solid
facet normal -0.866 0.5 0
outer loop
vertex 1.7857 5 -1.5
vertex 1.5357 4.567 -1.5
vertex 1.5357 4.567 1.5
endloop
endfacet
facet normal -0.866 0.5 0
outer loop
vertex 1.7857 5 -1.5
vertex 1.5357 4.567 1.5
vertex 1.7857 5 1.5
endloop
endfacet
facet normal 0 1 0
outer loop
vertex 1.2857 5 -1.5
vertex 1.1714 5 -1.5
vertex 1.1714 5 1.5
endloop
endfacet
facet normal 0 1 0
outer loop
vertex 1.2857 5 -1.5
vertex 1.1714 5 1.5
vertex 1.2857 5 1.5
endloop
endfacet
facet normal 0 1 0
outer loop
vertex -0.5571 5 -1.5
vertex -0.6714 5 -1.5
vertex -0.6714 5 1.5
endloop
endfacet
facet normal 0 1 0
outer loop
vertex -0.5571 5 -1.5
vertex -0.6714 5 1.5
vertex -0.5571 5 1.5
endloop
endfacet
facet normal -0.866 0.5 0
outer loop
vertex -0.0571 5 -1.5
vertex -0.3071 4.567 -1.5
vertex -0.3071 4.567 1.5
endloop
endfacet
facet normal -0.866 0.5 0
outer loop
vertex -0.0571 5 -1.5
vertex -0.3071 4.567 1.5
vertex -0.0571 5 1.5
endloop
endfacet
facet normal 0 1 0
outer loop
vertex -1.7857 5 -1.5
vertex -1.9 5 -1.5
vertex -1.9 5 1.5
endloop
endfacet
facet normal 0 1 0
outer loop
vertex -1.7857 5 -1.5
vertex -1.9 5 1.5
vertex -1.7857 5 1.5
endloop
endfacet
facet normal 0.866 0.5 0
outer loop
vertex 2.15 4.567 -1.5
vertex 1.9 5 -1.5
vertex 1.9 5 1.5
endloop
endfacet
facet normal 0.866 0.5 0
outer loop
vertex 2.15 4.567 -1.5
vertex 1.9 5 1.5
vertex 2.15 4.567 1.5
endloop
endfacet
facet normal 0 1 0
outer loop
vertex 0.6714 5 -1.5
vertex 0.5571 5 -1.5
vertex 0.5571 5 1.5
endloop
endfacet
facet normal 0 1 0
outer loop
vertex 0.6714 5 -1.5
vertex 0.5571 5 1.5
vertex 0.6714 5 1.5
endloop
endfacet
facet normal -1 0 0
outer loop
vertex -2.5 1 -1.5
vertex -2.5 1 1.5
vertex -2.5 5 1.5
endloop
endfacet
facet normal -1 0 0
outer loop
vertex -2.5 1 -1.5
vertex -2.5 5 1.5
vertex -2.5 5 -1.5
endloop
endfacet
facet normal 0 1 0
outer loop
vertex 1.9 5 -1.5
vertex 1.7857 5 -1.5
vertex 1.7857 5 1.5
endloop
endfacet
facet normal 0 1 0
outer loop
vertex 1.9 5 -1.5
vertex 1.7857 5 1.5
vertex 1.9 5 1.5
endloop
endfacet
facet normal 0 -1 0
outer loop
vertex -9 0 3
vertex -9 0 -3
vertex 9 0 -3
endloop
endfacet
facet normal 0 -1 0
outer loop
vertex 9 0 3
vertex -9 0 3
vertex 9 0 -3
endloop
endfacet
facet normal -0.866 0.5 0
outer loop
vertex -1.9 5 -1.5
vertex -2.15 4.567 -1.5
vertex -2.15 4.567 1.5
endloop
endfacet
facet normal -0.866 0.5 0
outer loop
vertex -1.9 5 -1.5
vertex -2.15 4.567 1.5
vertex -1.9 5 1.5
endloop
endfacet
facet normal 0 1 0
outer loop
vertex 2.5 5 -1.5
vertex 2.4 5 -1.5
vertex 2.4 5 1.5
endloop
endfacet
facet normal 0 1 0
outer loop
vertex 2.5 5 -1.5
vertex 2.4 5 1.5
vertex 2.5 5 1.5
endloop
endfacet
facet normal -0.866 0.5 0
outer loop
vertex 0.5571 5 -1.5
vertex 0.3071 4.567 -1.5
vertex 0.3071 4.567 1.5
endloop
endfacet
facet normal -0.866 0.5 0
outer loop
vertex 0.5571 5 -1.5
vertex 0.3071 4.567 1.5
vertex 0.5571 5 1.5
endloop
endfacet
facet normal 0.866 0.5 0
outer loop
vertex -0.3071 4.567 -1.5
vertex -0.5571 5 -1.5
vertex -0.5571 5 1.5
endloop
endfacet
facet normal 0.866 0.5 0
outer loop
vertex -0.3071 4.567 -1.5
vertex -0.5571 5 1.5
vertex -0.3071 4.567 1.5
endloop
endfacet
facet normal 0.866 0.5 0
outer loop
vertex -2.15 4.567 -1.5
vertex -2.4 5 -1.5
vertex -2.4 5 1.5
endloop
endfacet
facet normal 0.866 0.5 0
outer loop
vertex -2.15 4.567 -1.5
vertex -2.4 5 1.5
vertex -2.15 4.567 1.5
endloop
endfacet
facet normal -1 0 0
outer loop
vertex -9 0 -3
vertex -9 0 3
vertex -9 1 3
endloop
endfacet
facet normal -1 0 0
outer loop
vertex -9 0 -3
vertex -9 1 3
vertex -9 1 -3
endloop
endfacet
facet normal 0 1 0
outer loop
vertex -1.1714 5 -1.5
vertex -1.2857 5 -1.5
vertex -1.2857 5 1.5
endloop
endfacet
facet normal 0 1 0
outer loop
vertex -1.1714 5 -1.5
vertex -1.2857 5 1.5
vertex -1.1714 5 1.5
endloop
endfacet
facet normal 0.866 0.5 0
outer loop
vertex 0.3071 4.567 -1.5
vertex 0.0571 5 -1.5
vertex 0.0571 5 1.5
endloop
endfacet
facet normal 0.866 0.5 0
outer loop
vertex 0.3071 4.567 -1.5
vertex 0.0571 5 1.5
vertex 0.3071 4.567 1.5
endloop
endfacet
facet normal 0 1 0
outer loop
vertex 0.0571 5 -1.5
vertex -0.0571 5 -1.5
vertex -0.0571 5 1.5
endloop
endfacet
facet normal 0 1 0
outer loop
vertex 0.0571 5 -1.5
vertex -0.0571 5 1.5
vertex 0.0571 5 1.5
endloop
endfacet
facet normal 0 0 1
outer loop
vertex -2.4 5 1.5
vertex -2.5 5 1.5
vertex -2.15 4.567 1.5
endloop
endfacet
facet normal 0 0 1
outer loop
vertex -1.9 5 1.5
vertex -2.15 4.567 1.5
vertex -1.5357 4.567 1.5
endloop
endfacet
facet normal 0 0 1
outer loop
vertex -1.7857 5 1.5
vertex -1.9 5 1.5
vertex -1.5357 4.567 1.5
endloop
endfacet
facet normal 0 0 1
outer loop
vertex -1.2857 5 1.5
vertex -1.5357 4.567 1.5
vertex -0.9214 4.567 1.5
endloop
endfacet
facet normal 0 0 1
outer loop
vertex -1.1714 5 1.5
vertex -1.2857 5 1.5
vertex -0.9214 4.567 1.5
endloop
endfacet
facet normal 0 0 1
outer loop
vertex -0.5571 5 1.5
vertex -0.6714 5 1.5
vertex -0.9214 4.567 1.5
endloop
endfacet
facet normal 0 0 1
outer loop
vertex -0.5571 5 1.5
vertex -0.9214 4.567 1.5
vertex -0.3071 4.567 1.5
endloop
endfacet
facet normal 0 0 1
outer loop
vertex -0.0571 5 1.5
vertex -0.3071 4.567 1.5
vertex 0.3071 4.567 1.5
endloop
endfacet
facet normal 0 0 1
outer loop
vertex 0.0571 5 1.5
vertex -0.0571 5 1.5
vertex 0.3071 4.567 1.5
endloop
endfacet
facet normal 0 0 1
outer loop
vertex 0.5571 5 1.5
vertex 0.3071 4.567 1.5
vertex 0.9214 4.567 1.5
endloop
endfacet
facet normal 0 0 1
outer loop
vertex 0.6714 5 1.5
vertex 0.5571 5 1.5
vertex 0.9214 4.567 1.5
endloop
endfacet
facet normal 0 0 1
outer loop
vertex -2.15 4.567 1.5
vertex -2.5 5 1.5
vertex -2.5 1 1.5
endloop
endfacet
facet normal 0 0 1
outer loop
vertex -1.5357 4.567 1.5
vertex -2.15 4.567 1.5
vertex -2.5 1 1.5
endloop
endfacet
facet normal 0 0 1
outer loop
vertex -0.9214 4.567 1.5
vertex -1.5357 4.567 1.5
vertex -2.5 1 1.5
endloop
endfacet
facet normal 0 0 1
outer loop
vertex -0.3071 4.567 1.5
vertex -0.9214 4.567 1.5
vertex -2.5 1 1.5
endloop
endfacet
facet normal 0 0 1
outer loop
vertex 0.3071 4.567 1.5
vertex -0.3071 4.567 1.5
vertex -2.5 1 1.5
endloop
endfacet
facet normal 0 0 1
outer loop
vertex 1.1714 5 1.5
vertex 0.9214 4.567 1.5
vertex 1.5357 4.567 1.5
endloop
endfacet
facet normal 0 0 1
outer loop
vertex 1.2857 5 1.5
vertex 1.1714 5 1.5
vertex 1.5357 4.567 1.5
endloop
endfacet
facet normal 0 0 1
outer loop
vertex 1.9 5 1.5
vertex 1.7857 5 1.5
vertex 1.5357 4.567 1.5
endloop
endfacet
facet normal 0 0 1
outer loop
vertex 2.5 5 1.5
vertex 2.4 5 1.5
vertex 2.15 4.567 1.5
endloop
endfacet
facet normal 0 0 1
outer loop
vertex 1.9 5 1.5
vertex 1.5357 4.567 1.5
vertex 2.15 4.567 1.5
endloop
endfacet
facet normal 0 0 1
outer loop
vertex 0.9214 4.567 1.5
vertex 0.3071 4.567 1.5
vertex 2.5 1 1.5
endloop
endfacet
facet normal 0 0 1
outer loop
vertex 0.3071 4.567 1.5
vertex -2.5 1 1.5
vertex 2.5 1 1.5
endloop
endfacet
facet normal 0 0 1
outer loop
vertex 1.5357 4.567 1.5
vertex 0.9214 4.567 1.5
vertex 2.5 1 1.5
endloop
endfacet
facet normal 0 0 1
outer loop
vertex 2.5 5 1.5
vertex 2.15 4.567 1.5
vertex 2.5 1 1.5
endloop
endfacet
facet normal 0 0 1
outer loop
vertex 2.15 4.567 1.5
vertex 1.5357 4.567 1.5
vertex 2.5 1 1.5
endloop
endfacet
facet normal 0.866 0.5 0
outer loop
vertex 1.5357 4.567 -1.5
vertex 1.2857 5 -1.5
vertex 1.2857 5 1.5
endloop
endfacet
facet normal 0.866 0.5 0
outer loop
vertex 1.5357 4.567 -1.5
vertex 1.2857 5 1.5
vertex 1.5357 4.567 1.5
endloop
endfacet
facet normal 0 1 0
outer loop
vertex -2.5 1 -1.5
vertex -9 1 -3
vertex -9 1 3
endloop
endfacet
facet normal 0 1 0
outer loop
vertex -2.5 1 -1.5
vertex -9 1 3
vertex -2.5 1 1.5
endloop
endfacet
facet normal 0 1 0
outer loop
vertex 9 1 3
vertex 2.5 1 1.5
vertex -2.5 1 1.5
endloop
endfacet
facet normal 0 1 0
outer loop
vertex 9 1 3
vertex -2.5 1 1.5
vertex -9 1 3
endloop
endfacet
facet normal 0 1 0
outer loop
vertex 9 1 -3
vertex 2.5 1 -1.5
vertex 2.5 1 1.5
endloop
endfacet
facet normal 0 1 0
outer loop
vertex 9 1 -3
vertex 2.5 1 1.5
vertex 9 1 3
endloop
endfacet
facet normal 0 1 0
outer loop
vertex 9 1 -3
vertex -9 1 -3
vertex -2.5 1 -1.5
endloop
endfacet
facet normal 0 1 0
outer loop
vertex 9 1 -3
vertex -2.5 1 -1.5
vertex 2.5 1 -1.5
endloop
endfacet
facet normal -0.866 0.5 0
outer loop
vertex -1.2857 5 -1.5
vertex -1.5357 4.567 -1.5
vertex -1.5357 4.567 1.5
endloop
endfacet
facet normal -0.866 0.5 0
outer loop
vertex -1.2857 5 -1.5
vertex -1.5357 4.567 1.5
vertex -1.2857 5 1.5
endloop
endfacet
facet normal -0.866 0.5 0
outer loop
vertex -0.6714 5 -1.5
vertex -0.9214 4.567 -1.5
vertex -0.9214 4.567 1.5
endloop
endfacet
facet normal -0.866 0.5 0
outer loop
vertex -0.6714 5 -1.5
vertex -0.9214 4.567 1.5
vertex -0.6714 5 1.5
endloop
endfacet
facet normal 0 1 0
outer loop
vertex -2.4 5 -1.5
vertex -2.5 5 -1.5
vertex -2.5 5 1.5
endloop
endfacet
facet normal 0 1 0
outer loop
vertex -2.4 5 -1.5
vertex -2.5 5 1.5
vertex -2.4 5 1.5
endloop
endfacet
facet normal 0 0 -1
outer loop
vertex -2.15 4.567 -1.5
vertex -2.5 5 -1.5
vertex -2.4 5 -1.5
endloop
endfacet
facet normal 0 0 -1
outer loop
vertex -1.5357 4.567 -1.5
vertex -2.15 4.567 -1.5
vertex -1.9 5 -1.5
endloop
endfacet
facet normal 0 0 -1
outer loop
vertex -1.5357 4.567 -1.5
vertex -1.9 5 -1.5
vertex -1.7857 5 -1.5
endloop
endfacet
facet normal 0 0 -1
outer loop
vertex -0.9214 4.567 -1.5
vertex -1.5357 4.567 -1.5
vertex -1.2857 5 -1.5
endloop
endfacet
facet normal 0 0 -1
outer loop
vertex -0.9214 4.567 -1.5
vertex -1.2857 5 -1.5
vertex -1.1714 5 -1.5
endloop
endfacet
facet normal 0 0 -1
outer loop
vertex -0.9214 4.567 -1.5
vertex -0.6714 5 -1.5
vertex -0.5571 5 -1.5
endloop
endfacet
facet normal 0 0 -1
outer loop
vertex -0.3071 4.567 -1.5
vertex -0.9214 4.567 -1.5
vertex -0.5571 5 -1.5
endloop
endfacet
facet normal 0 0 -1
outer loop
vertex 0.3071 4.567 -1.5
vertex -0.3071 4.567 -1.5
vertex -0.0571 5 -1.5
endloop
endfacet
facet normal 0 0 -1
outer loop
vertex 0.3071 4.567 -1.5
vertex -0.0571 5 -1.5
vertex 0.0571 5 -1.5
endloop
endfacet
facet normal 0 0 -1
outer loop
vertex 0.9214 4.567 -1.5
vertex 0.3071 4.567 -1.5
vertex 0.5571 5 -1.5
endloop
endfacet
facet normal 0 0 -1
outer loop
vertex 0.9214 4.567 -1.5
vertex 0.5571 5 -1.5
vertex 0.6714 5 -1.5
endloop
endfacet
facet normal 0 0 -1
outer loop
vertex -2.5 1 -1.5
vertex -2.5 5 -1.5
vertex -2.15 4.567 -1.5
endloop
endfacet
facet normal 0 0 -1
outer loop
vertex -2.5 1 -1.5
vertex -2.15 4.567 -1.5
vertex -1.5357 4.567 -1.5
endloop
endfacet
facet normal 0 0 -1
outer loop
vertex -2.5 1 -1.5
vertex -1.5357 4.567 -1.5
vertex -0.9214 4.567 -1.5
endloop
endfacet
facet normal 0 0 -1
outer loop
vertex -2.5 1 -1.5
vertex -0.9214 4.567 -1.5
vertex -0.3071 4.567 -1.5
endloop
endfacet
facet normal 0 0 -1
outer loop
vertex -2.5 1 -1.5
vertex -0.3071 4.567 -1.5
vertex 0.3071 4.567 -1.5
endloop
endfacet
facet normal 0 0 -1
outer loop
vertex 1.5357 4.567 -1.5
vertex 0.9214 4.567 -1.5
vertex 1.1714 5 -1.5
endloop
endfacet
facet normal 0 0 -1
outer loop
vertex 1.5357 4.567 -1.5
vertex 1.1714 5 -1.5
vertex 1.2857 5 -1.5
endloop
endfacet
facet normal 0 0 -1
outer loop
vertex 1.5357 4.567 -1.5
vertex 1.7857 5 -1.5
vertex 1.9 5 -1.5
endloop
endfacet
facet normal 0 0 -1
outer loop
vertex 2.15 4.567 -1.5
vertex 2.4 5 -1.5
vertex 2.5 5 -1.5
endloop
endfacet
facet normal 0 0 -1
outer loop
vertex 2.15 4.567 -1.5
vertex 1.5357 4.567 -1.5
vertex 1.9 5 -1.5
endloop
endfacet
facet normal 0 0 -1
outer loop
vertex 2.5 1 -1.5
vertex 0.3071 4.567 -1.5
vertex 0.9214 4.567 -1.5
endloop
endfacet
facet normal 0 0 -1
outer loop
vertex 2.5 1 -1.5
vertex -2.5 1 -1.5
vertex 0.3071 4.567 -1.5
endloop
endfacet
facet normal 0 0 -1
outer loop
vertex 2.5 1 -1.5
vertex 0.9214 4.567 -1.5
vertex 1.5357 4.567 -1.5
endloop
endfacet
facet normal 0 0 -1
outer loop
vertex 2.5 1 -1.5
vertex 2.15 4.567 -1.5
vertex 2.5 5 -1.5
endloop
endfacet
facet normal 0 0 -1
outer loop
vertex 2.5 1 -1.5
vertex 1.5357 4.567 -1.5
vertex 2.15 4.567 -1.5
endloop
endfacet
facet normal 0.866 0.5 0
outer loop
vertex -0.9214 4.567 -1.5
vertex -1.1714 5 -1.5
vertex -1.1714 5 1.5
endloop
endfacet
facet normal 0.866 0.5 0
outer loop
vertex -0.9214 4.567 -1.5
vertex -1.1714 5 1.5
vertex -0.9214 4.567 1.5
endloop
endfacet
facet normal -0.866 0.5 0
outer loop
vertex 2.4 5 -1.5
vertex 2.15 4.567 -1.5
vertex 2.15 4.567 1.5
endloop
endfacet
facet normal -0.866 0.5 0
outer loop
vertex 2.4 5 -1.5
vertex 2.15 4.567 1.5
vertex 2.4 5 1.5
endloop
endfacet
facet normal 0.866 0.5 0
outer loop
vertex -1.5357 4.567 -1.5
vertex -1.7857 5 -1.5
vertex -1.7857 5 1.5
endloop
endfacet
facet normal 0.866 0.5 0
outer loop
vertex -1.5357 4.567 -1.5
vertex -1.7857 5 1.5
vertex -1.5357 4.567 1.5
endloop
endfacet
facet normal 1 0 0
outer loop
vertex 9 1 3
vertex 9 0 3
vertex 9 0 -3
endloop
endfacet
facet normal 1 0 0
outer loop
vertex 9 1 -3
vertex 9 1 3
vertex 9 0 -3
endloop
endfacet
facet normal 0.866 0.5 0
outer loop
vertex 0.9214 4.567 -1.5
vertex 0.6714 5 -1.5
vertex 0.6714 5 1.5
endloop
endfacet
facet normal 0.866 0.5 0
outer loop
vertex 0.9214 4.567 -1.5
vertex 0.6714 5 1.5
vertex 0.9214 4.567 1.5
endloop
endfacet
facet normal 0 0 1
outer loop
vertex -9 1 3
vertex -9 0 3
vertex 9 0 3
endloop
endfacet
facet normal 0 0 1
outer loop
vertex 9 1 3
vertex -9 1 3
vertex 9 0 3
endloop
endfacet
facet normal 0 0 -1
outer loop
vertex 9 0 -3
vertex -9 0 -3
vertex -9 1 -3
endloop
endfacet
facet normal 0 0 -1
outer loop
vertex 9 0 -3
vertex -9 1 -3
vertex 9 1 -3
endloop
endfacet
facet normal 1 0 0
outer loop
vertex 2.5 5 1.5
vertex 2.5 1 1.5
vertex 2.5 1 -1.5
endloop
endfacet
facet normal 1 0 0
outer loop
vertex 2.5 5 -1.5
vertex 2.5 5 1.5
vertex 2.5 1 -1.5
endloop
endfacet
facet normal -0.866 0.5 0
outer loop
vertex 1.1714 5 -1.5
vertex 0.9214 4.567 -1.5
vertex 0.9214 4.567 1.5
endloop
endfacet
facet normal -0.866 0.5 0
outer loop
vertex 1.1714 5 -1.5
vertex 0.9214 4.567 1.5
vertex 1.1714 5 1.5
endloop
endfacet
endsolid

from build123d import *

# Parameters (mm, degrees)
SKETCH1_W           = 18
SKETCH1_H           = 6
BOSS_EXTRUDE1_DEPTH = 1
SKETCH2_W           = 5
SKETCH2_H           = 3
BOSS_EXTRUDE2_DEPTH = 4
CUT_EXTRUDE1_START  = -5.5
CUT_EXTRUDE1_DEPTH  = 8
LPATTERN1_COUNT     = 8
LPATTERN1_PITCH     = 0.614285714


with BuildPart() as part:
    # Sketch1 → Boss-Extrude1 (new body)
    with BuildSketch(Plane(origin=(0, 0, 0), x_dir=(1, 0, 0), z_dir=(0, 1, 0))):
        Rectangle(SKETCH1_W, SKETCH1_H)
    extrude(amount=BOSS_EXTRUDE1_DEPTH)

    # Sketch2 → Boss-Extrude2 (add)
    with BuildSketch(Plane(origin=(0, 1, 0), x_dir=(1, 0, 0), z_dir=(0, 1, 0))):
        Rectangle(SKETCH2_W, SKETCH2_H)
    extrude(amount=BOSS_EXTRUDE2_DEPTH)

    # Sketch3 → Cut-Extrude1 (cut)
    with BuildSketch(Plane.XY.offset(1.5).offset(CUT_EXTRUDE1_START)):
        Polygon((-2.15, 4.566987298), (-1.9, 5), (-2.4, 5), align=None)
    cut_extrude1 = extrude(amount=CUT_EXTRUDE1_DEPTH, mode=Mode.SUBTRACT)

    # LPattern1: Cut-Extrude1 ×8
    with Locations(*[(i * LPATTERN1_PITCH, 0, 0) for i in range(1, LPATTERN1_COUNT)]):
        add(cut_extrude1, mode=Mode.SUBTRACT)


solid = part.part
